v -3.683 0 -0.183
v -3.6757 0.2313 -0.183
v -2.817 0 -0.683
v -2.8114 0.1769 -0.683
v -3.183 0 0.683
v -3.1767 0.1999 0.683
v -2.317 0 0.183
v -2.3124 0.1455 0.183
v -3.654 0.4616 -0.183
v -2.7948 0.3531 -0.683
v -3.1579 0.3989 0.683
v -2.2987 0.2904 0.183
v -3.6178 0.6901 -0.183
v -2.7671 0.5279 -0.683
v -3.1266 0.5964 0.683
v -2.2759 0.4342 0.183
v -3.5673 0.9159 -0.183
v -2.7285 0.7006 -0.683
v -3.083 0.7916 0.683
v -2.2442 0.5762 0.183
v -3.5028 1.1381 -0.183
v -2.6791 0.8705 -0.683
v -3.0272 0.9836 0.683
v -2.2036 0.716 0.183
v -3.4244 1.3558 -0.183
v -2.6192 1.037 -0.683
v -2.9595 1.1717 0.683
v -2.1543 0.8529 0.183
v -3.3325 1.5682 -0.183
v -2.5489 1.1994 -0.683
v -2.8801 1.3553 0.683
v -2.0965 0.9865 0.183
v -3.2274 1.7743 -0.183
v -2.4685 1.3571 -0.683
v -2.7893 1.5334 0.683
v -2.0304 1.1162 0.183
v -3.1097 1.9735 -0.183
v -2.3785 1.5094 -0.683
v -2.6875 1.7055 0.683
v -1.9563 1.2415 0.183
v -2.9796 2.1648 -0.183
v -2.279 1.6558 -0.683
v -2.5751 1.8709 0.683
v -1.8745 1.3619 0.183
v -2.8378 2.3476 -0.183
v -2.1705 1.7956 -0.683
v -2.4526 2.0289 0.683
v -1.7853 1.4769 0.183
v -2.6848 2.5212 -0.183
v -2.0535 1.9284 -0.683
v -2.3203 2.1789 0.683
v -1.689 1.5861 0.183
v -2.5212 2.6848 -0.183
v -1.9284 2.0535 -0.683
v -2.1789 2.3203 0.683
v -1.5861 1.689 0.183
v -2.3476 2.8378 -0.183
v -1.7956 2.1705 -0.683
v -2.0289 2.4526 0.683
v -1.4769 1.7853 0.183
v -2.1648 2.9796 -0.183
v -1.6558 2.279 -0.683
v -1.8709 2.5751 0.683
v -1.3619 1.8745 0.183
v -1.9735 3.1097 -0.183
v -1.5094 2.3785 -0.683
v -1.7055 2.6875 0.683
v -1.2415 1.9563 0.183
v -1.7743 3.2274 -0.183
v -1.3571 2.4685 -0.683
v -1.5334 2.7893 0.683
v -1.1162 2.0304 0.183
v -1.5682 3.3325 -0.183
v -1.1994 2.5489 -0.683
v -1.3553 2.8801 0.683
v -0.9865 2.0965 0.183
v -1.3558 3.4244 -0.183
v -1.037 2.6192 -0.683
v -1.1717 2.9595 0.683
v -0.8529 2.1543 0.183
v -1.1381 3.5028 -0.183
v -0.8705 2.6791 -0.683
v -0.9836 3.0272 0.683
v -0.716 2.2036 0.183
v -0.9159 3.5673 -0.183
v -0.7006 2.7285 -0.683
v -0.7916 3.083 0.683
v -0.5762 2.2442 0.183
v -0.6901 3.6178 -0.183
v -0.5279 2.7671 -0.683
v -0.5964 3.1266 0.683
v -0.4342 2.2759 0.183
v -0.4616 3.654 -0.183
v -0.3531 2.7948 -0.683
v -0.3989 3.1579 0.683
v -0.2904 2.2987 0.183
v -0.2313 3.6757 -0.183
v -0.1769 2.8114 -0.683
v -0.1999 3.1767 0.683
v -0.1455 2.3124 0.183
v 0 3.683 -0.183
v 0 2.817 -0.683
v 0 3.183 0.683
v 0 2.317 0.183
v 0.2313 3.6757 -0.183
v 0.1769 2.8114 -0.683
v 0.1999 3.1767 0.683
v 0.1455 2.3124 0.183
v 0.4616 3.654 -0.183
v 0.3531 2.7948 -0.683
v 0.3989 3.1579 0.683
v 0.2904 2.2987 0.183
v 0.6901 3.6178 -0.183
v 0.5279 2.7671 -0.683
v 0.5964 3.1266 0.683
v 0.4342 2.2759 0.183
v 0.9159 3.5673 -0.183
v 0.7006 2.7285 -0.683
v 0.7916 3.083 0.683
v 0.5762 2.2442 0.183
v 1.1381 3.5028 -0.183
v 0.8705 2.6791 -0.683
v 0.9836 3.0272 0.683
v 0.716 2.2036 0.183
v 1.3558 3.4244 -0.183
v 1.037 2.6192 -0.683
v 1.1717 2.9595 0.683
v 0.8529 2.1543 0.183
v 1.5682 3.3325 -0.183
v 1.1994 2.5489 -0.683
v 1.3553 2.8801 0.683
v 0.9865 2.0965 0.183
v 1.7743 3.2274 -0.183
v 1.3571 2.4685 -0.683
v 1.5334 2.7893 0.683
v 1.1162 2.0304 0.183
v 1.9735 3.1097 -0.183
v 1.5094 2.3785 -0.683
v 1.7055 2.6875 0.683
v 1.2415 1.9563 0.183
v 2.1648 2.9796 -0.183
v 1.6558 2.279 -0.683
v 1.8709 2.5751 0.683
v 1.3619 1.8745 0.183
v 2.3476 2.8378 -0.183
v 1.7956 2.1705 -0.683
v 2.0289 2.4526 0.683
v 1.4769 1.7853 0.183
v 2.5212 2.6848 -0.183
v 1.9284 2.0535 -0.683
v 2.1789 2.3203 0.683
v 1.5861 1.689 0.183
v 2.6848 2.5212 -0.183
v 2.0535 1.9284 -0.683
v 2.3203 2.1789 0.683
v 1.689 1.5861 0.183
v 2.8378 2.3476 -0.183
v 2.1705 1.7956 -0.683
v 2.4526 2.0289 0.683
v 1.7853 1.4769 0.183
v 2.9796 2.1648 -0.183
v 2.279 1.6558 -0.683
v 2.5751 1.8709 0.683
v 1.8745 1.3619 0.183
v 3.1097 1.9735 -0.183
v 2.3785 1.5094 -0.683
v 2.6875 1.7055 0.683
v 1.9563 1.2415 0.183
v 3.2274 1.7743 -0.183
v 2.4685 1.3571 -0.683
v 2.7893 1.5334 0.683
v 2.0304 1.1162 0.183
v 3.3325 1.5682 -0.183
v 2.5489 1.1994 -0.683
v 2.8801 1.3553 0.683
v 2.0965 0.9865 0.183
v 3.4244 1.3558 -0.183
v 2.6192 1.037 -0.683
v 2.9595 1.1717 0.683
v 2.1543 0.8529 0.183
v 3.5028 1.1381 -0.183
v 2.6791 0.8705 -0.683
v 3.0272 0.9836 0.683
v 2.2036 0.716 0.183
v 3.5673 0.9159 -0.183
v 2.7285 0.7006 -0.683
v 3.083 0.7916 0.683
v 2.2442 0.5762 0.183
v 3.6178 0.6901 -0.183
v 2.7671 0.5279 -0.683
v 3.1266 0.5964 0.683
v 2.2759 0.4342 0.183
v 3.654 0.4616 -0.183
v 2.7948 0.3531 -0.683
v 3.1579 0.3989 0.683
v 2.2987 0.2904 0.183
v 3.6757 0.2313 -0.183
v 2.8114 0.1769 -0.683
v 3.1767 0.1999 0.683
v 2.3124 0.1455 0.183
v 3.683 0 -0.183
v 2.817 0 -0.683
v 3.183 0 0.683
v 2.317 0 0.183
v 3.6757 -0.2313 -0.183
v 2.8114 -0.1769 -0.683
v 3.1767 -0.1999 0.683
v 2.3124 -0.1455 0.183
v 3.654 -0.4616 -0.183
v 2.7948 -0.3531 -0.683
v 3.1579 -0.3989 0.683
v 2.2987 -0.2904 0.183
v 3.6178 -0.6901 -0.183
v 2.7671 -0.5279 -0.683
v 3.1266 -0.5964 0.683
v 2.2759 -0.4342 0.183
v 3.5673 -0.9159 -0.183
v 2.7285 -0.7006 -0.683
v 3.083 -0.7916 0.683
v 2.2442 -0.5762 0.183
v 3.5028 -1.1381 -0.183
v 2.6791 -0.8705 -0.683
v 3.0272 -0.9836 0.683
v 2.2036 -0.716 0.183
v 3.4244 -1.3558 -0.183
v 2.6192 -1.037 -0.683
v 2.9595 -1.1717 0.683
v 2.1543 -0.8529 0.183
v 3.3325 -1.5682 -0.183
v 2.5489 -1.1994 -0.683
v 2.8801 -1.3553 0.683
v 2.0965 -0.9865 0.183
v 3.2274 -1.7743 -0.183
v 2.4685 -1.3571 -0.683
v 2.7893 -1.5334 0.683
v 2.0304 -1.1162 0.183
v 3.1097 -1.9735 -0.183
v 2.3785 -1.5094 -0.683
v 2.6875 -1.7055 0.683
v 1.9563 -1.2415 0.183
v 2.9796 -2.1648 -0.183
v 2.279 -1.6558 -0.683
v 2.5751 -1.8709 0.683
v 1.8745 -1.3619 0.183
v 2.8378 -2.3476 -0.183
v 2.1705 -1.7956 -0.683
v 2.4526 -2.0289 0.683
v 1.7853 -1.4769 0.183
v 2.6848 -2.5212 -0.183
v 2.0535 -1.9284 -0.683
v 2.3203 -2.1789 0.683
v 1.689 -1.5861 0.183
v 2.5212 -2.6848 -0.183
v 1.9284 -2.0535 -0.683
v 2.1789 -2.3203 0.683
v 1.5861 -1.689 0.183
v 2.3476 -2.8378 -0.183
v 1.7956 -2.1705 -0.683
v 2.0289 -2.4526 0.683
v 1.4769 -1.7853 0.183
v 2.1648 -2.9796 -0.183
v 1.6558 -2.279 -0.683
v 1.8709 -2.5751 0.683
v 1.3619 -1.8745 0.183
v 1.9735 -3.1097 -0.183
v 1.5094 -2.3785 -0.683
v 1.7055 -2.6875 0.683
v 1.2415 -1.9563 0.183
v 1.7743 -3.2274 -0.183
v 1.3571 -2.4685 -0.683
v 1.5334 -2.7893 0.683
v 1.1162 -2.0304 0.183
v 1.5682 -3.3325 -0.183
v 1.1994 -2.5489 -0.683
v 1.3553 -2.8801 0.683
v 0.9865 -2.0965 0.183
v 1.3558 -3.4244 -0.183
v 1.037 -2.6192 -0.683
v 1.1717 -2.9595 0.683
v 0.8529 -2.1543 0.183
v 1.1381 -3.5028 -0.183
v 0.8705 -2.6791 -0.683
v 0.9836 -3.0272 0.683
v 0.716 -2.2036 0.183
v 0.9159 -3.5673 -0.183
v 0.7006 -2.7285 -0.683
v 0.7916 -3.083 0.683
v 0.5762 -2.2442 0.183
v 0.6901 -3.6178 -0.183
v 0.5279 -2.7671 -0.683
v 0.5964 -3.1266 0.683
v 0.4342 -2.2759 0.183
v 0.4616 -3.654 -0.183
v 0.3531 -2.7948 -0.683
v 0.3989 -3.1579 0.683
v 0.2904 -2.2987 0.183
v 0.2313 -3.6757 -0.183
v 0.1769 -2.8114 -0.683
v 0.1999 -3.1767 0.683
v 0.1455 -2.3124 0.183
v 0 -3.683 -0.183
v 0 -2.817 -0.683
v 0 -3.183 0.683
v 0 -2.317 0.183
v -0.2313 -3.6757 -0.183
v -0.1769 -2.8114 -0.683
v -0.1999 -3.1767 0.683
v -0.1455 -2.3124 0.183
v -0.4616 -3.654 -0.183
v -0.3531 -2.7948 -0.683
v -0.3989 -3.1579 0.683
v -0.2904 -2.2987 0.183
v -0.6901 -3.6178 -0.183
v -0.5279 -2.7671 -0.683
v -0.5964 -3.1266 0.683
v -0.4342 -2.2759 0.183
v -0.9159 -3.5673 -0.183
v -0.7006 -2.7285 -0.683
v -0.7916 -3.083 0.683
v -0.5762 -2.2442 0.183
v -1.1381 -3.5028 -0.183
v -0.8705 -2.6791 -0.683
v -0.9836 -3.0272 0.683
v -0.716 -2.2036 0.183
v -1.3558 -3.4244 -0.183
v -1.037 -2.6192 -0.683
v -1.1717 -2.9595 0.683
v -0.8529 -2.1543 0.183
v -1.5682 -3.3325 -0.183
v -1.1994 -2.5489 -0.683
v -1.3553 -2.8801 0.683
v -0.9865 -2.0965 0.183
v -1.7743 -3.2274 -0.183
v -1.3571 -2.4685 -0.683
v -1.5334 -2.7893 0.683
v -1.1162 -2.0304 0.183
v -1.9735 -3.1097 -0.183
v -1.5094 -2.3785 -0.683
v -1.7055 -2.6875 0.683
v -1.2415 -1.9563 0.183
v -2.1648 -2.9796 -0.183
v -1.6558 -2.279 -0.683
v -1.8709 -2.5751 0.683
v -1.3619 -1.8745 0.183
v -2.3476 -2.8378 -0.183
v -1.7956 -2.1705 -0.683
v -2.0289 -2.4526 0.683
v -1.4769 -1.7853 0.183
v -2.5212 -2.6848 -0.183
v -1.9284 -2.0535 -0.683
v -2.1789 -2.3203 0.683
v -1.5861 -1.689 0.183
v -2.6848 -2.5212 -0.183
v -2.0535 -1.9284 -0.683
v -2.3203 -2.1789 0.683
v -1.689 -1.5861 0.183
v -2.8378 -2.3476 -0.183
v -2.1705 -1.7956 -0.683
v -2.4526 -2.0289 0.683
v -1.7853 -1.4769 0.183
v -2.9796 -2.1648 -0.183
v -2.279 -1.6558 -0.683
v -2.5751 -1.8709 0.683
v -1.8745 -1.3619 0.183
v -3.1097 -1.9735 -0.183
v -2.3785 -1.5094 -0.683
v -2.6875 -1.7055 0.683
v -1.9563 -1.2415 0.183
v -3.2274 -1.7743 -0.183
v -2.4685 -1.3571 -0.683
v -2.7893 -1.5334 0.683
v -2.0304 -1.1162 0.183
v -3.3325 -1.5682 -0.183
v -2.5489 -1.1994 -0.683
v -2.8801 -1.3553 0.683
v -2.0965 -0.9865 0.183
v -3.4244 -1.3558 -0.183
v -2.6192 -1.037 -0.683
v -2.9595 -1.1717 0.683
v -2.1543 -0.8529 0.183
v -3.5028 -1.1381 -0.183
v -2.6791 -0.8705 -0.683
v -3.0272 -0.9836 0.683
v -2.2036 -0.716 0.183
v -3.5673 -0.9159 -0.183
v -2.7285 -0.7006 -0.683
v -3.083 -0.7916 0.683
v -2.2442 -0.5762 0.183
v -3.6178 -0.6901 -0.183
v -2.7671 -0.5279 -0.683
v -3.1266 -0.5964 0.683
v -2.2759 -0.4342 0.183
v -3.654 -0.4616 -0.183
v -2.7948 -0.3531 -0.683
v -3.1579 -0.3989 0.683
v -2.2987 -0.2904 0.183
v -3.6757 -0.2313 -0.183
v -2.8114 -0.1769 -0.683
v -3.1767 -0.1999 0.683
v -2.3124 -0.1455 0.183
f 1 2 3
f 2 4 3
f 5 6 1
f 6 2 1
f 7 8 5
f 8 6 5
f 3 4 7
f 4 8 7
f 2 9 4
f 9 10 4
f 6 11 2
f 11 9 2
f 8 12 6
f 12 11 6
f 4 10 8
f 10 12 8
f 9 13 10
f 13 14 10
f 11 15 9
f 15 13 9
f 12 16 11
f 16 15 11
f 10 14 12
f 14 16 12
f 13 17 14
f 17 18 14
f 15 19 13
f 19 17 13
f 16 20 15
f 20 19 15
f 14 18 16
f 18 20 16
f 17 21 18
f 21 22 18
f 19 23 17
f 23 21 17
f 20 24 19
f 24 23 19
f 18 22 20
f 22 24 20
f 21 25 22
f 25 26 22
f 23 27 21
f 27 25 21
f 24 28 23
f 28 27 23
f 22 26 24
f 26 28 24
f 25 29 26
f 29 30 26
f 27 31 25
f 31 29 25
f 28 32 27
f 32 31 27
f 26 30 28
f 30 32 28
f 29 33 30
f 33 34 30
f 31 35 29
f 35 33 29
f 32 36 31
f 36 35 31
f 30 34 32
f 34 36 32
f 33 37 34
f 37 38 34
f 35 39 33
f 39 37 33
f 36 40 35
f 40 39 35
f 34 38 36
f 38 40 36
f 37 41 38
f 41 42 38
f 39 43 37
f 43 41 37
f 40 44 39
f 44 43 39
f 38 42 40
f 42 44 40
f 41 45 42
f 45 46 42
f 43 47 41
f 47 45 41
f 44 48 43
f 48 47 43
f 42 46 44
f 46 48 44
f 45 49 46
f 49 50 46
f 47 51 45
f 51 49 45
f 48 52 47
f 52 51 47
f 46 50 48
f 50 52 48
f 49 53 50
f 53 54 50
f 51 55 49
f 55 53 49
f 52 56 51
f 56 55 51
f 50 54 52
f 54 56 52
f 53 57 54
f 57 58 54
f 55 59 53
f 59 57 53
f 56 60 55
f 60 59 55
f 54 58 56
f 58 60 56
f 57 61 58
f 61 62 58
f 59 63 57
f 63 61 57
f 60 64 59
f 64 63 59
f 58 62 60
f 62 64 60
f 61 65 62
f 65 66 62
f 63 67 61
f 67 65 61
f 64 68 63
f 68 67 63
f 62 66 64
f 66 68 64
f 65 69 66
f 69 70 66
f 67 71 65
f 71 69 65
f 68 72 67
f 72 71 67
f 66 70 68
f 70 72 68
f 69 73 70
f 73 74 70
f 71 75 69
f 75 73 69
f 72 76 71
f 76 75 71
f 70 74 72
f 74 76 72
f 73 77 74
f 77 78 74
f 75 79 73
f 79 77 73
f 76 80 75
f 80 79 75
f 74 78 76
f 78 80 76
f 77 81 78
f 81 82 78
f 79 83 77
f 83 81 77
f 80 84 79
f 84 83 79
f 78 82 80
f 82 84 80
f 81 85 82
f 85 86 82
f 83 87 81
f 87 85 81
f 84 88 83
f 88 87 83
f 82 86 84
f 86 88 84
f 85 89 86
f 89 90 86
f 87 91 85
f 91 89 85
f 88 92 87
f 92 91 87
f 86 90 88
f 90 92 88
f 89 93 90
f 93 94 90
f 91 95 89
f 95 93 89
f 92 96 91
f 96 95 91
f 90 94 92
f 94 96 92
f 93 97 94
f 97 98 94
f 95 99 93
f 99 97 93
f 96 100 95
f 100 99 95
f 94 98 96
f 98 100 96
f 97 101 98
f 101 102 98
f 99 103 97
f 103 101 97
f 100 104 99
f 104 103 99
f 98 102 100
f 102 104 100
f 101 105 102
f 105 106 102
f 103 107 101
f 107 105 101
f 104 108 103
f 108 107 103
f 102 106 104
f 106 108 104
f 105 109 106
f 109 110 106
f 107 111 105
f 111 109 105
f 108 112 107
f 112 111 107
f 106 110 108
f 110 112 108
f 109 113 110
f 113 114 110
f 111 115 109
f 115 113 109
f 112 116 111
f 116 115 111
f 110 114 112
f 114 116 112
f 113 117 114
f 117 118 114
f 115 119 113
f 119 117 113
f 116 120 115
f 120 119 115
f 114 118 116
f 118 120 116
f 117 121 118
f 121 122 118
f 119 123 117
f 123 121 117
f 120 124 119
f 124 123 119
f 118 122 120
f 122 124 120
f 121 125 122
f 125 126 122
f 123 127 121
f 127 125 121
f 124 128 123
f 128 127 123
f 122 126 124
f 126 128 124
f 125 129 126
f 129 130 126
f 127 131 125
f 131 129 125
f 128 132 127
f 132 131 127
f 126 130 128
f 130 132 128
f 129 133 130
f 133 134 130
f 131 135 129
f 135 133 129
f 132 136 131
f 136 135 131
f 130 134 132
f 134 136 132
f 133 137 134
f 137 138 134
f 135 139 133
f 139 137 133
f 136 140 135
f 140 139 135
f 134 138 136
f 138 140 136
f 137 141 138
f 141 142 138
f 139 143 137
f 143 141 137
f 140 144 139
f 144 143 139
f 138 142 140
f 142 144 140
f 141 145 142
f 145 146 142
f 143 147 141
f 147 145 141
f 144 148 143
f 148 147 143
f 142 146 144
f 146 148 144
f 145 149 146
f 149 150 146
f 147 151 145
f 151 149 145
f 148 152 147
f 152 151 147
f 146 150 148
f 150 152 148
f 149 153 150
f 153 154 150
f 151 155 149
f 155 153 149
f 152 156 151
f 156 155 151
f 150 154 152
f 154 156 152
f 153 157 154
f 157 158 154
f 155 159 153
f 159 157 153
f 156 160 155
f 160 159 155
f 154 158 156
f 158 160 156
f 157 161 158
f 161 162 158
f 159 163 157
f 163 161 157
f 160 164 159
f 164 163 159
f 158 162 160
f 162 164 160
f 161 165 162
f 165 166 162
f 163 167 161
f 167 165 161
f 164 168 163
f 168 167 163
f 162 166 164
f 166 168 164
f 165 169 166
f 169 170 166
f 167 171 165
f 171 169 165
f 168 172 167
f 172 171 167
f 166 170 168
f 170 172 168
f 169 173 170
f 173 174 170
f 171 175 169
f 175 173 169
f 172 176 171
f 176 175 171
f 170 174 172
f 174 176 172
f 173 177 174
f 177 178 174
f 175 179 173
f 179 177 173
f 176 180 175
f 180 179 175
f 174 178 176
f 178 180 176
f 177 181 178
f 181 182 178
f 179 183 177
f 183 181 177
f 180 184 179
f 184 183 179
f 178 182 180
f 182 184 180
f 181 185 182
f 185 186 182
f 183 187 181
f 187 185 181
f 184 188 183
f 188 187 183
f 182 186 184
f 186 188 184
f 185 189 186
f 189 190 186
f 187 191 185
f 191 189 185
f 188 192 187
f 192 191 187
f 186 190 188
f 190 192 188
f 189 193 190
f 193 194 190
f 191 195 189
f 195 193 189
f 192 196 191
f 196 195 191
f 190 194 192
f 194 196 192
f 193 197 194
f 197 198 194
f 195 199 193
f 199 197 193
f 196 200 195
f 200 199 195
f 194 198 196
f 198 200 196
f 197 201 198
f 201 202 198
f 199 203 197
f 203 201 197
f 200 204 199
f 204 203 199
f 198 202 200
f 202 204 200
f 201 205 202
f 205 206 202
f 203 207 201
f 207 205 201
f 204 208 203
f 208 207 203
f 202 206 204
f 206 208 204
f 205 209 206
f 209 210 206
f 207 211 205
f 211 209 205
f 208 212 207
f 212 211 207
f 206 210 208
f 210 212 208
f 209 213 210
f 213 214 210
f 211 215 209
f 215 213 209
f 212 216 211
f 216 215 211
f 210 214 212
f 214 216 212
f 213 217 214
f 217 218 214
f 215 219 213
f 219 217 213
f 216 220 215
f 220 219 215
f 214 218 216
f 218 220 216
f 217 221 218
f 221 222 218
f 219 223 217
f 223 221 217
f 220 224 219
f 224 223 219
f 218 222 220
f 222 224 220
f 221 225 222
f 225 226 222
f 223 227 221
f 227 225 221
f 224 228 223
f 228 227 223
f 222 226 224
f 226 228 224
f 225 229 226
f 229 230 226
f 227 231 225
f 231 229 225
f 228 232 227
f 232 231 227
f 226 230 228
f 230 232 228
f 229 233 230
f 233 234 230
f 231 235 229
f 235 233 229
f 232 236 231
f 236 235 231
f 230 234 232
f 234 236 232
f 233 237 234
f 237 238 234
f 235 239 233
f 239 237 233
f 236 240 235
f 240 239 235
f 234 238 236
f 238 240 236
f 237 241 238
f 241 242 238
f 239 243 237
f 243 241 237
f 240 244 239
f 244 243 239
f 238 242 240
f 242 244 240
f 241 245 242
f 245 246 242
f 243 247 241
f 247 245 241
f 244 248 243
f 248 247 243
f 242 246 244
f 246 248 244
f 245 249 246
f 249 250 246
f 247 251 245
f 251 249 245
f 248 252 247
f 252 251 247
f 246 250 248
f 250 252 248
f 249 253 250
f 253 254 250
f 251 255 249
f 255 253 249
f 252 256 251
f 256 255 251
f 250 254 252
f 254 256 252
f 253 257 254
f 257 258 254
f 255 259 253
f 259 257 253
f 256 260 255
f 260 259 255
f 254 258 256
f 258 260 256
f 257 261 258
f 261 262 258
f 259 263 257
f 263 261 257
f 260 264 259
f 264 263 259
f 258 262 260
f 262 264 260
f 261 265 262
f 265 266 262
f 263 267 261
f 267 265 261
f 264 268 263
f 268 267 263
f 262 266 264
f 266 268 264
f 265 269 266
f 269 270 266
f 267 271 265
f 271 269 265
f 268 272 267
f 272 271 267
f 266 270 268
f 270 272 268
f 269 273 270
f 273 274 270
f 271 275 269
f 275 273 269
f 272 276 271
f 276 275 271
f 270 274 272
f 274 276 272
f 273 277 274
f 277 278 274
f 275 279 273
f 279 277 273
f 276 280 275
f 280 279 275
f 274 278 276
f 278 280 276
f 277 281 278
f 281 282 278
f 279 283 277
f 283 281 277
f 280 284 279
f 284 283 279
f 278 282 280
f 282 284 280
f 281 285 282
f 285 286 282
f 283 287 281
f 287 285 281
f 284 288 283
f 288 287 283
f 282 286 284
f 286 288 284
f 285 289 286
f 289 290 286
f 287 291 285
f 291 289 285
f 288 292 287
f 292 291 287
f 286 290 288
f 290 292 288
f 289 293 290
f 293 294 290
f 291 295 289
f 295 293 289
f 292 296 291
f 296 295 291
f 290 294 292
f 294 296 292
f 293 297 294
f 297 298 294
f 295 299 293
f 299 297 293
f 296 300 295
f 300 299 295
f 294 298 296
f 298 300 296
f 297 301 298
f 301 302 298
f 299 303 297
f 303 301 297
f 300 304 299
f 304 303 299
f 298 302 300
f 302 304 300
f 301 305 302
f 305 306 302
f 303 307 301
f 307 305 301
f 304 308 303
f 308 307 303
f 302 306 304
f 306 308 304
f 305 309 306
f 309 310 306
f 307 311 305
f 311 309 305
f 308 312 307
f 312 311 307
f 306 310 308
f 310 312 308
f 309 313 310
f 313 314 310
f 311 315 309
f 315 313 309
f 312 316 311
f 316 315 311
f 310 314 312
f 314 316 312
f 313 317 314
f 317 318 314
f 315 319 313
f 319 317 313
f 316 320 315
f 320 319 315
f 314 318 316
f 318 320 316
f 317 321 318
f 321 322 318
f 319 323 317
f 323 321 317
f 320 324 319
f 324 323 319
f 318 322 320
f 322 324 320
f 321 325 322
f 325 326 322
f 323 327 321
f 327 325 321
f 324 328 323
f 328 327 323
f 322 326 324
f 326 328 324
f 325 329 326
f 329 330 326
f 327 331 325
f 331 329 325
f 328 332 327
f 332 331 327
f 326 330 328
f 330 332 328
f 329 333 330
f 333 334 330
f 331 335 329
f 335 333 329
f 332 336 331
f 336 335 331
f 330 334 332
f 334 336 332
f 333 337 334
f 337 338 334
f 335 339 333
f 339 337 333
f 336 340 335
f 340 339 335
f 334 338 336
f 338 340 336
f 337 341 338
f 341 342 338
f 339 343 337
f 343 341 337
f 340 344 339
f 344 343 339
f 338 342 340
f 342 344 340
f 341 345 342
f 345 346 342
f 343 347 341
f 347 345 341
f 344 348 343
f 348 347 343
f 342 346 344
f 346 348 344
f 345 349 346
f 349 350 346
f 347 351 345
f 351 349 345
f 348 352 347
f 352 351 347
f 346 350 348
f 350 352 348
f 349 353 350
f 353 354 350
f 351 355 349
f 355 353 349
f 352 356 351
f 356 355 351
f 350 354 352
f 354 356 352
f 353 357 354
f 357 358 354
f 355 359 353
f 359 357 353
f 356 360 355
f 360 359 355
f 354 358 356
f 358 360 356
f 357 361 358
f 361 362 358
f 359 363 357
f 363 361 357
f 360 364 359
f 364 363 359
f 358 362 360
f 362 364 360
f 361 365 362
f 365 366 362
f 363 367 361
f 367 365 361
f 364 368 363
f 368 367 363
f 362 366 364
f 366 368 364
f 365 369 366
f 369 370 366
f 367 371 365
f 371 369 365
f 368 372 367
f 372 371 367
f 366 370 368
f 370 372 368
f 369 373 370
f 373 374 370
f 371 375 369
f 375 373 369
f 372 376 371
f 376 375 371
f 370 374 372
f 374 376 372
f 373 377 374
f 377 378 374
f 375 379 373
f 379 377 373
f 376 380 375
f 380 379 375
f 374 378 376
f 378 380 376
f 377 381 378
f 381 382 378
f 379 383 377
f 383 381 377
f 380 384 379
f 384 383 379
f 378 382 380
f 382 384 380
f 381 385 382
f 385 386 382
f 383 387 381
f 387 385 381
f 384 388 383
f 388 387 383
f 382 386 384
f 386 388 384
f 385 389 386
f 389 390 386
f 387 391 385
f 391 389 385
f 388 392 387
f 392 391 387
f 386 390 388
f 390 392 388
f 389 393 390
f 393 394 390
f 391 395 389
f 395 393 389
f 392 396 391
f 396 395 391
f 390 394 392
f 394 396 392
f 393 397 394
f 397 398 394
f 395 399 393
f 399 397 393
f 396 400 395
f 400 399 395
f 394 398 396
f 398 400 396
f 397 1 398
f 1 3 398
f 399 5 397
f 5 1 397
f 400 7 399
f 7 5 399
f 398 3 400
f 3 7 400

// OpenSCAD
$fn=100;
rotate_extrude()
translate([3, 0, 0])
rotate([0, 0, 30])
square(size=[1, 1], center=true);
